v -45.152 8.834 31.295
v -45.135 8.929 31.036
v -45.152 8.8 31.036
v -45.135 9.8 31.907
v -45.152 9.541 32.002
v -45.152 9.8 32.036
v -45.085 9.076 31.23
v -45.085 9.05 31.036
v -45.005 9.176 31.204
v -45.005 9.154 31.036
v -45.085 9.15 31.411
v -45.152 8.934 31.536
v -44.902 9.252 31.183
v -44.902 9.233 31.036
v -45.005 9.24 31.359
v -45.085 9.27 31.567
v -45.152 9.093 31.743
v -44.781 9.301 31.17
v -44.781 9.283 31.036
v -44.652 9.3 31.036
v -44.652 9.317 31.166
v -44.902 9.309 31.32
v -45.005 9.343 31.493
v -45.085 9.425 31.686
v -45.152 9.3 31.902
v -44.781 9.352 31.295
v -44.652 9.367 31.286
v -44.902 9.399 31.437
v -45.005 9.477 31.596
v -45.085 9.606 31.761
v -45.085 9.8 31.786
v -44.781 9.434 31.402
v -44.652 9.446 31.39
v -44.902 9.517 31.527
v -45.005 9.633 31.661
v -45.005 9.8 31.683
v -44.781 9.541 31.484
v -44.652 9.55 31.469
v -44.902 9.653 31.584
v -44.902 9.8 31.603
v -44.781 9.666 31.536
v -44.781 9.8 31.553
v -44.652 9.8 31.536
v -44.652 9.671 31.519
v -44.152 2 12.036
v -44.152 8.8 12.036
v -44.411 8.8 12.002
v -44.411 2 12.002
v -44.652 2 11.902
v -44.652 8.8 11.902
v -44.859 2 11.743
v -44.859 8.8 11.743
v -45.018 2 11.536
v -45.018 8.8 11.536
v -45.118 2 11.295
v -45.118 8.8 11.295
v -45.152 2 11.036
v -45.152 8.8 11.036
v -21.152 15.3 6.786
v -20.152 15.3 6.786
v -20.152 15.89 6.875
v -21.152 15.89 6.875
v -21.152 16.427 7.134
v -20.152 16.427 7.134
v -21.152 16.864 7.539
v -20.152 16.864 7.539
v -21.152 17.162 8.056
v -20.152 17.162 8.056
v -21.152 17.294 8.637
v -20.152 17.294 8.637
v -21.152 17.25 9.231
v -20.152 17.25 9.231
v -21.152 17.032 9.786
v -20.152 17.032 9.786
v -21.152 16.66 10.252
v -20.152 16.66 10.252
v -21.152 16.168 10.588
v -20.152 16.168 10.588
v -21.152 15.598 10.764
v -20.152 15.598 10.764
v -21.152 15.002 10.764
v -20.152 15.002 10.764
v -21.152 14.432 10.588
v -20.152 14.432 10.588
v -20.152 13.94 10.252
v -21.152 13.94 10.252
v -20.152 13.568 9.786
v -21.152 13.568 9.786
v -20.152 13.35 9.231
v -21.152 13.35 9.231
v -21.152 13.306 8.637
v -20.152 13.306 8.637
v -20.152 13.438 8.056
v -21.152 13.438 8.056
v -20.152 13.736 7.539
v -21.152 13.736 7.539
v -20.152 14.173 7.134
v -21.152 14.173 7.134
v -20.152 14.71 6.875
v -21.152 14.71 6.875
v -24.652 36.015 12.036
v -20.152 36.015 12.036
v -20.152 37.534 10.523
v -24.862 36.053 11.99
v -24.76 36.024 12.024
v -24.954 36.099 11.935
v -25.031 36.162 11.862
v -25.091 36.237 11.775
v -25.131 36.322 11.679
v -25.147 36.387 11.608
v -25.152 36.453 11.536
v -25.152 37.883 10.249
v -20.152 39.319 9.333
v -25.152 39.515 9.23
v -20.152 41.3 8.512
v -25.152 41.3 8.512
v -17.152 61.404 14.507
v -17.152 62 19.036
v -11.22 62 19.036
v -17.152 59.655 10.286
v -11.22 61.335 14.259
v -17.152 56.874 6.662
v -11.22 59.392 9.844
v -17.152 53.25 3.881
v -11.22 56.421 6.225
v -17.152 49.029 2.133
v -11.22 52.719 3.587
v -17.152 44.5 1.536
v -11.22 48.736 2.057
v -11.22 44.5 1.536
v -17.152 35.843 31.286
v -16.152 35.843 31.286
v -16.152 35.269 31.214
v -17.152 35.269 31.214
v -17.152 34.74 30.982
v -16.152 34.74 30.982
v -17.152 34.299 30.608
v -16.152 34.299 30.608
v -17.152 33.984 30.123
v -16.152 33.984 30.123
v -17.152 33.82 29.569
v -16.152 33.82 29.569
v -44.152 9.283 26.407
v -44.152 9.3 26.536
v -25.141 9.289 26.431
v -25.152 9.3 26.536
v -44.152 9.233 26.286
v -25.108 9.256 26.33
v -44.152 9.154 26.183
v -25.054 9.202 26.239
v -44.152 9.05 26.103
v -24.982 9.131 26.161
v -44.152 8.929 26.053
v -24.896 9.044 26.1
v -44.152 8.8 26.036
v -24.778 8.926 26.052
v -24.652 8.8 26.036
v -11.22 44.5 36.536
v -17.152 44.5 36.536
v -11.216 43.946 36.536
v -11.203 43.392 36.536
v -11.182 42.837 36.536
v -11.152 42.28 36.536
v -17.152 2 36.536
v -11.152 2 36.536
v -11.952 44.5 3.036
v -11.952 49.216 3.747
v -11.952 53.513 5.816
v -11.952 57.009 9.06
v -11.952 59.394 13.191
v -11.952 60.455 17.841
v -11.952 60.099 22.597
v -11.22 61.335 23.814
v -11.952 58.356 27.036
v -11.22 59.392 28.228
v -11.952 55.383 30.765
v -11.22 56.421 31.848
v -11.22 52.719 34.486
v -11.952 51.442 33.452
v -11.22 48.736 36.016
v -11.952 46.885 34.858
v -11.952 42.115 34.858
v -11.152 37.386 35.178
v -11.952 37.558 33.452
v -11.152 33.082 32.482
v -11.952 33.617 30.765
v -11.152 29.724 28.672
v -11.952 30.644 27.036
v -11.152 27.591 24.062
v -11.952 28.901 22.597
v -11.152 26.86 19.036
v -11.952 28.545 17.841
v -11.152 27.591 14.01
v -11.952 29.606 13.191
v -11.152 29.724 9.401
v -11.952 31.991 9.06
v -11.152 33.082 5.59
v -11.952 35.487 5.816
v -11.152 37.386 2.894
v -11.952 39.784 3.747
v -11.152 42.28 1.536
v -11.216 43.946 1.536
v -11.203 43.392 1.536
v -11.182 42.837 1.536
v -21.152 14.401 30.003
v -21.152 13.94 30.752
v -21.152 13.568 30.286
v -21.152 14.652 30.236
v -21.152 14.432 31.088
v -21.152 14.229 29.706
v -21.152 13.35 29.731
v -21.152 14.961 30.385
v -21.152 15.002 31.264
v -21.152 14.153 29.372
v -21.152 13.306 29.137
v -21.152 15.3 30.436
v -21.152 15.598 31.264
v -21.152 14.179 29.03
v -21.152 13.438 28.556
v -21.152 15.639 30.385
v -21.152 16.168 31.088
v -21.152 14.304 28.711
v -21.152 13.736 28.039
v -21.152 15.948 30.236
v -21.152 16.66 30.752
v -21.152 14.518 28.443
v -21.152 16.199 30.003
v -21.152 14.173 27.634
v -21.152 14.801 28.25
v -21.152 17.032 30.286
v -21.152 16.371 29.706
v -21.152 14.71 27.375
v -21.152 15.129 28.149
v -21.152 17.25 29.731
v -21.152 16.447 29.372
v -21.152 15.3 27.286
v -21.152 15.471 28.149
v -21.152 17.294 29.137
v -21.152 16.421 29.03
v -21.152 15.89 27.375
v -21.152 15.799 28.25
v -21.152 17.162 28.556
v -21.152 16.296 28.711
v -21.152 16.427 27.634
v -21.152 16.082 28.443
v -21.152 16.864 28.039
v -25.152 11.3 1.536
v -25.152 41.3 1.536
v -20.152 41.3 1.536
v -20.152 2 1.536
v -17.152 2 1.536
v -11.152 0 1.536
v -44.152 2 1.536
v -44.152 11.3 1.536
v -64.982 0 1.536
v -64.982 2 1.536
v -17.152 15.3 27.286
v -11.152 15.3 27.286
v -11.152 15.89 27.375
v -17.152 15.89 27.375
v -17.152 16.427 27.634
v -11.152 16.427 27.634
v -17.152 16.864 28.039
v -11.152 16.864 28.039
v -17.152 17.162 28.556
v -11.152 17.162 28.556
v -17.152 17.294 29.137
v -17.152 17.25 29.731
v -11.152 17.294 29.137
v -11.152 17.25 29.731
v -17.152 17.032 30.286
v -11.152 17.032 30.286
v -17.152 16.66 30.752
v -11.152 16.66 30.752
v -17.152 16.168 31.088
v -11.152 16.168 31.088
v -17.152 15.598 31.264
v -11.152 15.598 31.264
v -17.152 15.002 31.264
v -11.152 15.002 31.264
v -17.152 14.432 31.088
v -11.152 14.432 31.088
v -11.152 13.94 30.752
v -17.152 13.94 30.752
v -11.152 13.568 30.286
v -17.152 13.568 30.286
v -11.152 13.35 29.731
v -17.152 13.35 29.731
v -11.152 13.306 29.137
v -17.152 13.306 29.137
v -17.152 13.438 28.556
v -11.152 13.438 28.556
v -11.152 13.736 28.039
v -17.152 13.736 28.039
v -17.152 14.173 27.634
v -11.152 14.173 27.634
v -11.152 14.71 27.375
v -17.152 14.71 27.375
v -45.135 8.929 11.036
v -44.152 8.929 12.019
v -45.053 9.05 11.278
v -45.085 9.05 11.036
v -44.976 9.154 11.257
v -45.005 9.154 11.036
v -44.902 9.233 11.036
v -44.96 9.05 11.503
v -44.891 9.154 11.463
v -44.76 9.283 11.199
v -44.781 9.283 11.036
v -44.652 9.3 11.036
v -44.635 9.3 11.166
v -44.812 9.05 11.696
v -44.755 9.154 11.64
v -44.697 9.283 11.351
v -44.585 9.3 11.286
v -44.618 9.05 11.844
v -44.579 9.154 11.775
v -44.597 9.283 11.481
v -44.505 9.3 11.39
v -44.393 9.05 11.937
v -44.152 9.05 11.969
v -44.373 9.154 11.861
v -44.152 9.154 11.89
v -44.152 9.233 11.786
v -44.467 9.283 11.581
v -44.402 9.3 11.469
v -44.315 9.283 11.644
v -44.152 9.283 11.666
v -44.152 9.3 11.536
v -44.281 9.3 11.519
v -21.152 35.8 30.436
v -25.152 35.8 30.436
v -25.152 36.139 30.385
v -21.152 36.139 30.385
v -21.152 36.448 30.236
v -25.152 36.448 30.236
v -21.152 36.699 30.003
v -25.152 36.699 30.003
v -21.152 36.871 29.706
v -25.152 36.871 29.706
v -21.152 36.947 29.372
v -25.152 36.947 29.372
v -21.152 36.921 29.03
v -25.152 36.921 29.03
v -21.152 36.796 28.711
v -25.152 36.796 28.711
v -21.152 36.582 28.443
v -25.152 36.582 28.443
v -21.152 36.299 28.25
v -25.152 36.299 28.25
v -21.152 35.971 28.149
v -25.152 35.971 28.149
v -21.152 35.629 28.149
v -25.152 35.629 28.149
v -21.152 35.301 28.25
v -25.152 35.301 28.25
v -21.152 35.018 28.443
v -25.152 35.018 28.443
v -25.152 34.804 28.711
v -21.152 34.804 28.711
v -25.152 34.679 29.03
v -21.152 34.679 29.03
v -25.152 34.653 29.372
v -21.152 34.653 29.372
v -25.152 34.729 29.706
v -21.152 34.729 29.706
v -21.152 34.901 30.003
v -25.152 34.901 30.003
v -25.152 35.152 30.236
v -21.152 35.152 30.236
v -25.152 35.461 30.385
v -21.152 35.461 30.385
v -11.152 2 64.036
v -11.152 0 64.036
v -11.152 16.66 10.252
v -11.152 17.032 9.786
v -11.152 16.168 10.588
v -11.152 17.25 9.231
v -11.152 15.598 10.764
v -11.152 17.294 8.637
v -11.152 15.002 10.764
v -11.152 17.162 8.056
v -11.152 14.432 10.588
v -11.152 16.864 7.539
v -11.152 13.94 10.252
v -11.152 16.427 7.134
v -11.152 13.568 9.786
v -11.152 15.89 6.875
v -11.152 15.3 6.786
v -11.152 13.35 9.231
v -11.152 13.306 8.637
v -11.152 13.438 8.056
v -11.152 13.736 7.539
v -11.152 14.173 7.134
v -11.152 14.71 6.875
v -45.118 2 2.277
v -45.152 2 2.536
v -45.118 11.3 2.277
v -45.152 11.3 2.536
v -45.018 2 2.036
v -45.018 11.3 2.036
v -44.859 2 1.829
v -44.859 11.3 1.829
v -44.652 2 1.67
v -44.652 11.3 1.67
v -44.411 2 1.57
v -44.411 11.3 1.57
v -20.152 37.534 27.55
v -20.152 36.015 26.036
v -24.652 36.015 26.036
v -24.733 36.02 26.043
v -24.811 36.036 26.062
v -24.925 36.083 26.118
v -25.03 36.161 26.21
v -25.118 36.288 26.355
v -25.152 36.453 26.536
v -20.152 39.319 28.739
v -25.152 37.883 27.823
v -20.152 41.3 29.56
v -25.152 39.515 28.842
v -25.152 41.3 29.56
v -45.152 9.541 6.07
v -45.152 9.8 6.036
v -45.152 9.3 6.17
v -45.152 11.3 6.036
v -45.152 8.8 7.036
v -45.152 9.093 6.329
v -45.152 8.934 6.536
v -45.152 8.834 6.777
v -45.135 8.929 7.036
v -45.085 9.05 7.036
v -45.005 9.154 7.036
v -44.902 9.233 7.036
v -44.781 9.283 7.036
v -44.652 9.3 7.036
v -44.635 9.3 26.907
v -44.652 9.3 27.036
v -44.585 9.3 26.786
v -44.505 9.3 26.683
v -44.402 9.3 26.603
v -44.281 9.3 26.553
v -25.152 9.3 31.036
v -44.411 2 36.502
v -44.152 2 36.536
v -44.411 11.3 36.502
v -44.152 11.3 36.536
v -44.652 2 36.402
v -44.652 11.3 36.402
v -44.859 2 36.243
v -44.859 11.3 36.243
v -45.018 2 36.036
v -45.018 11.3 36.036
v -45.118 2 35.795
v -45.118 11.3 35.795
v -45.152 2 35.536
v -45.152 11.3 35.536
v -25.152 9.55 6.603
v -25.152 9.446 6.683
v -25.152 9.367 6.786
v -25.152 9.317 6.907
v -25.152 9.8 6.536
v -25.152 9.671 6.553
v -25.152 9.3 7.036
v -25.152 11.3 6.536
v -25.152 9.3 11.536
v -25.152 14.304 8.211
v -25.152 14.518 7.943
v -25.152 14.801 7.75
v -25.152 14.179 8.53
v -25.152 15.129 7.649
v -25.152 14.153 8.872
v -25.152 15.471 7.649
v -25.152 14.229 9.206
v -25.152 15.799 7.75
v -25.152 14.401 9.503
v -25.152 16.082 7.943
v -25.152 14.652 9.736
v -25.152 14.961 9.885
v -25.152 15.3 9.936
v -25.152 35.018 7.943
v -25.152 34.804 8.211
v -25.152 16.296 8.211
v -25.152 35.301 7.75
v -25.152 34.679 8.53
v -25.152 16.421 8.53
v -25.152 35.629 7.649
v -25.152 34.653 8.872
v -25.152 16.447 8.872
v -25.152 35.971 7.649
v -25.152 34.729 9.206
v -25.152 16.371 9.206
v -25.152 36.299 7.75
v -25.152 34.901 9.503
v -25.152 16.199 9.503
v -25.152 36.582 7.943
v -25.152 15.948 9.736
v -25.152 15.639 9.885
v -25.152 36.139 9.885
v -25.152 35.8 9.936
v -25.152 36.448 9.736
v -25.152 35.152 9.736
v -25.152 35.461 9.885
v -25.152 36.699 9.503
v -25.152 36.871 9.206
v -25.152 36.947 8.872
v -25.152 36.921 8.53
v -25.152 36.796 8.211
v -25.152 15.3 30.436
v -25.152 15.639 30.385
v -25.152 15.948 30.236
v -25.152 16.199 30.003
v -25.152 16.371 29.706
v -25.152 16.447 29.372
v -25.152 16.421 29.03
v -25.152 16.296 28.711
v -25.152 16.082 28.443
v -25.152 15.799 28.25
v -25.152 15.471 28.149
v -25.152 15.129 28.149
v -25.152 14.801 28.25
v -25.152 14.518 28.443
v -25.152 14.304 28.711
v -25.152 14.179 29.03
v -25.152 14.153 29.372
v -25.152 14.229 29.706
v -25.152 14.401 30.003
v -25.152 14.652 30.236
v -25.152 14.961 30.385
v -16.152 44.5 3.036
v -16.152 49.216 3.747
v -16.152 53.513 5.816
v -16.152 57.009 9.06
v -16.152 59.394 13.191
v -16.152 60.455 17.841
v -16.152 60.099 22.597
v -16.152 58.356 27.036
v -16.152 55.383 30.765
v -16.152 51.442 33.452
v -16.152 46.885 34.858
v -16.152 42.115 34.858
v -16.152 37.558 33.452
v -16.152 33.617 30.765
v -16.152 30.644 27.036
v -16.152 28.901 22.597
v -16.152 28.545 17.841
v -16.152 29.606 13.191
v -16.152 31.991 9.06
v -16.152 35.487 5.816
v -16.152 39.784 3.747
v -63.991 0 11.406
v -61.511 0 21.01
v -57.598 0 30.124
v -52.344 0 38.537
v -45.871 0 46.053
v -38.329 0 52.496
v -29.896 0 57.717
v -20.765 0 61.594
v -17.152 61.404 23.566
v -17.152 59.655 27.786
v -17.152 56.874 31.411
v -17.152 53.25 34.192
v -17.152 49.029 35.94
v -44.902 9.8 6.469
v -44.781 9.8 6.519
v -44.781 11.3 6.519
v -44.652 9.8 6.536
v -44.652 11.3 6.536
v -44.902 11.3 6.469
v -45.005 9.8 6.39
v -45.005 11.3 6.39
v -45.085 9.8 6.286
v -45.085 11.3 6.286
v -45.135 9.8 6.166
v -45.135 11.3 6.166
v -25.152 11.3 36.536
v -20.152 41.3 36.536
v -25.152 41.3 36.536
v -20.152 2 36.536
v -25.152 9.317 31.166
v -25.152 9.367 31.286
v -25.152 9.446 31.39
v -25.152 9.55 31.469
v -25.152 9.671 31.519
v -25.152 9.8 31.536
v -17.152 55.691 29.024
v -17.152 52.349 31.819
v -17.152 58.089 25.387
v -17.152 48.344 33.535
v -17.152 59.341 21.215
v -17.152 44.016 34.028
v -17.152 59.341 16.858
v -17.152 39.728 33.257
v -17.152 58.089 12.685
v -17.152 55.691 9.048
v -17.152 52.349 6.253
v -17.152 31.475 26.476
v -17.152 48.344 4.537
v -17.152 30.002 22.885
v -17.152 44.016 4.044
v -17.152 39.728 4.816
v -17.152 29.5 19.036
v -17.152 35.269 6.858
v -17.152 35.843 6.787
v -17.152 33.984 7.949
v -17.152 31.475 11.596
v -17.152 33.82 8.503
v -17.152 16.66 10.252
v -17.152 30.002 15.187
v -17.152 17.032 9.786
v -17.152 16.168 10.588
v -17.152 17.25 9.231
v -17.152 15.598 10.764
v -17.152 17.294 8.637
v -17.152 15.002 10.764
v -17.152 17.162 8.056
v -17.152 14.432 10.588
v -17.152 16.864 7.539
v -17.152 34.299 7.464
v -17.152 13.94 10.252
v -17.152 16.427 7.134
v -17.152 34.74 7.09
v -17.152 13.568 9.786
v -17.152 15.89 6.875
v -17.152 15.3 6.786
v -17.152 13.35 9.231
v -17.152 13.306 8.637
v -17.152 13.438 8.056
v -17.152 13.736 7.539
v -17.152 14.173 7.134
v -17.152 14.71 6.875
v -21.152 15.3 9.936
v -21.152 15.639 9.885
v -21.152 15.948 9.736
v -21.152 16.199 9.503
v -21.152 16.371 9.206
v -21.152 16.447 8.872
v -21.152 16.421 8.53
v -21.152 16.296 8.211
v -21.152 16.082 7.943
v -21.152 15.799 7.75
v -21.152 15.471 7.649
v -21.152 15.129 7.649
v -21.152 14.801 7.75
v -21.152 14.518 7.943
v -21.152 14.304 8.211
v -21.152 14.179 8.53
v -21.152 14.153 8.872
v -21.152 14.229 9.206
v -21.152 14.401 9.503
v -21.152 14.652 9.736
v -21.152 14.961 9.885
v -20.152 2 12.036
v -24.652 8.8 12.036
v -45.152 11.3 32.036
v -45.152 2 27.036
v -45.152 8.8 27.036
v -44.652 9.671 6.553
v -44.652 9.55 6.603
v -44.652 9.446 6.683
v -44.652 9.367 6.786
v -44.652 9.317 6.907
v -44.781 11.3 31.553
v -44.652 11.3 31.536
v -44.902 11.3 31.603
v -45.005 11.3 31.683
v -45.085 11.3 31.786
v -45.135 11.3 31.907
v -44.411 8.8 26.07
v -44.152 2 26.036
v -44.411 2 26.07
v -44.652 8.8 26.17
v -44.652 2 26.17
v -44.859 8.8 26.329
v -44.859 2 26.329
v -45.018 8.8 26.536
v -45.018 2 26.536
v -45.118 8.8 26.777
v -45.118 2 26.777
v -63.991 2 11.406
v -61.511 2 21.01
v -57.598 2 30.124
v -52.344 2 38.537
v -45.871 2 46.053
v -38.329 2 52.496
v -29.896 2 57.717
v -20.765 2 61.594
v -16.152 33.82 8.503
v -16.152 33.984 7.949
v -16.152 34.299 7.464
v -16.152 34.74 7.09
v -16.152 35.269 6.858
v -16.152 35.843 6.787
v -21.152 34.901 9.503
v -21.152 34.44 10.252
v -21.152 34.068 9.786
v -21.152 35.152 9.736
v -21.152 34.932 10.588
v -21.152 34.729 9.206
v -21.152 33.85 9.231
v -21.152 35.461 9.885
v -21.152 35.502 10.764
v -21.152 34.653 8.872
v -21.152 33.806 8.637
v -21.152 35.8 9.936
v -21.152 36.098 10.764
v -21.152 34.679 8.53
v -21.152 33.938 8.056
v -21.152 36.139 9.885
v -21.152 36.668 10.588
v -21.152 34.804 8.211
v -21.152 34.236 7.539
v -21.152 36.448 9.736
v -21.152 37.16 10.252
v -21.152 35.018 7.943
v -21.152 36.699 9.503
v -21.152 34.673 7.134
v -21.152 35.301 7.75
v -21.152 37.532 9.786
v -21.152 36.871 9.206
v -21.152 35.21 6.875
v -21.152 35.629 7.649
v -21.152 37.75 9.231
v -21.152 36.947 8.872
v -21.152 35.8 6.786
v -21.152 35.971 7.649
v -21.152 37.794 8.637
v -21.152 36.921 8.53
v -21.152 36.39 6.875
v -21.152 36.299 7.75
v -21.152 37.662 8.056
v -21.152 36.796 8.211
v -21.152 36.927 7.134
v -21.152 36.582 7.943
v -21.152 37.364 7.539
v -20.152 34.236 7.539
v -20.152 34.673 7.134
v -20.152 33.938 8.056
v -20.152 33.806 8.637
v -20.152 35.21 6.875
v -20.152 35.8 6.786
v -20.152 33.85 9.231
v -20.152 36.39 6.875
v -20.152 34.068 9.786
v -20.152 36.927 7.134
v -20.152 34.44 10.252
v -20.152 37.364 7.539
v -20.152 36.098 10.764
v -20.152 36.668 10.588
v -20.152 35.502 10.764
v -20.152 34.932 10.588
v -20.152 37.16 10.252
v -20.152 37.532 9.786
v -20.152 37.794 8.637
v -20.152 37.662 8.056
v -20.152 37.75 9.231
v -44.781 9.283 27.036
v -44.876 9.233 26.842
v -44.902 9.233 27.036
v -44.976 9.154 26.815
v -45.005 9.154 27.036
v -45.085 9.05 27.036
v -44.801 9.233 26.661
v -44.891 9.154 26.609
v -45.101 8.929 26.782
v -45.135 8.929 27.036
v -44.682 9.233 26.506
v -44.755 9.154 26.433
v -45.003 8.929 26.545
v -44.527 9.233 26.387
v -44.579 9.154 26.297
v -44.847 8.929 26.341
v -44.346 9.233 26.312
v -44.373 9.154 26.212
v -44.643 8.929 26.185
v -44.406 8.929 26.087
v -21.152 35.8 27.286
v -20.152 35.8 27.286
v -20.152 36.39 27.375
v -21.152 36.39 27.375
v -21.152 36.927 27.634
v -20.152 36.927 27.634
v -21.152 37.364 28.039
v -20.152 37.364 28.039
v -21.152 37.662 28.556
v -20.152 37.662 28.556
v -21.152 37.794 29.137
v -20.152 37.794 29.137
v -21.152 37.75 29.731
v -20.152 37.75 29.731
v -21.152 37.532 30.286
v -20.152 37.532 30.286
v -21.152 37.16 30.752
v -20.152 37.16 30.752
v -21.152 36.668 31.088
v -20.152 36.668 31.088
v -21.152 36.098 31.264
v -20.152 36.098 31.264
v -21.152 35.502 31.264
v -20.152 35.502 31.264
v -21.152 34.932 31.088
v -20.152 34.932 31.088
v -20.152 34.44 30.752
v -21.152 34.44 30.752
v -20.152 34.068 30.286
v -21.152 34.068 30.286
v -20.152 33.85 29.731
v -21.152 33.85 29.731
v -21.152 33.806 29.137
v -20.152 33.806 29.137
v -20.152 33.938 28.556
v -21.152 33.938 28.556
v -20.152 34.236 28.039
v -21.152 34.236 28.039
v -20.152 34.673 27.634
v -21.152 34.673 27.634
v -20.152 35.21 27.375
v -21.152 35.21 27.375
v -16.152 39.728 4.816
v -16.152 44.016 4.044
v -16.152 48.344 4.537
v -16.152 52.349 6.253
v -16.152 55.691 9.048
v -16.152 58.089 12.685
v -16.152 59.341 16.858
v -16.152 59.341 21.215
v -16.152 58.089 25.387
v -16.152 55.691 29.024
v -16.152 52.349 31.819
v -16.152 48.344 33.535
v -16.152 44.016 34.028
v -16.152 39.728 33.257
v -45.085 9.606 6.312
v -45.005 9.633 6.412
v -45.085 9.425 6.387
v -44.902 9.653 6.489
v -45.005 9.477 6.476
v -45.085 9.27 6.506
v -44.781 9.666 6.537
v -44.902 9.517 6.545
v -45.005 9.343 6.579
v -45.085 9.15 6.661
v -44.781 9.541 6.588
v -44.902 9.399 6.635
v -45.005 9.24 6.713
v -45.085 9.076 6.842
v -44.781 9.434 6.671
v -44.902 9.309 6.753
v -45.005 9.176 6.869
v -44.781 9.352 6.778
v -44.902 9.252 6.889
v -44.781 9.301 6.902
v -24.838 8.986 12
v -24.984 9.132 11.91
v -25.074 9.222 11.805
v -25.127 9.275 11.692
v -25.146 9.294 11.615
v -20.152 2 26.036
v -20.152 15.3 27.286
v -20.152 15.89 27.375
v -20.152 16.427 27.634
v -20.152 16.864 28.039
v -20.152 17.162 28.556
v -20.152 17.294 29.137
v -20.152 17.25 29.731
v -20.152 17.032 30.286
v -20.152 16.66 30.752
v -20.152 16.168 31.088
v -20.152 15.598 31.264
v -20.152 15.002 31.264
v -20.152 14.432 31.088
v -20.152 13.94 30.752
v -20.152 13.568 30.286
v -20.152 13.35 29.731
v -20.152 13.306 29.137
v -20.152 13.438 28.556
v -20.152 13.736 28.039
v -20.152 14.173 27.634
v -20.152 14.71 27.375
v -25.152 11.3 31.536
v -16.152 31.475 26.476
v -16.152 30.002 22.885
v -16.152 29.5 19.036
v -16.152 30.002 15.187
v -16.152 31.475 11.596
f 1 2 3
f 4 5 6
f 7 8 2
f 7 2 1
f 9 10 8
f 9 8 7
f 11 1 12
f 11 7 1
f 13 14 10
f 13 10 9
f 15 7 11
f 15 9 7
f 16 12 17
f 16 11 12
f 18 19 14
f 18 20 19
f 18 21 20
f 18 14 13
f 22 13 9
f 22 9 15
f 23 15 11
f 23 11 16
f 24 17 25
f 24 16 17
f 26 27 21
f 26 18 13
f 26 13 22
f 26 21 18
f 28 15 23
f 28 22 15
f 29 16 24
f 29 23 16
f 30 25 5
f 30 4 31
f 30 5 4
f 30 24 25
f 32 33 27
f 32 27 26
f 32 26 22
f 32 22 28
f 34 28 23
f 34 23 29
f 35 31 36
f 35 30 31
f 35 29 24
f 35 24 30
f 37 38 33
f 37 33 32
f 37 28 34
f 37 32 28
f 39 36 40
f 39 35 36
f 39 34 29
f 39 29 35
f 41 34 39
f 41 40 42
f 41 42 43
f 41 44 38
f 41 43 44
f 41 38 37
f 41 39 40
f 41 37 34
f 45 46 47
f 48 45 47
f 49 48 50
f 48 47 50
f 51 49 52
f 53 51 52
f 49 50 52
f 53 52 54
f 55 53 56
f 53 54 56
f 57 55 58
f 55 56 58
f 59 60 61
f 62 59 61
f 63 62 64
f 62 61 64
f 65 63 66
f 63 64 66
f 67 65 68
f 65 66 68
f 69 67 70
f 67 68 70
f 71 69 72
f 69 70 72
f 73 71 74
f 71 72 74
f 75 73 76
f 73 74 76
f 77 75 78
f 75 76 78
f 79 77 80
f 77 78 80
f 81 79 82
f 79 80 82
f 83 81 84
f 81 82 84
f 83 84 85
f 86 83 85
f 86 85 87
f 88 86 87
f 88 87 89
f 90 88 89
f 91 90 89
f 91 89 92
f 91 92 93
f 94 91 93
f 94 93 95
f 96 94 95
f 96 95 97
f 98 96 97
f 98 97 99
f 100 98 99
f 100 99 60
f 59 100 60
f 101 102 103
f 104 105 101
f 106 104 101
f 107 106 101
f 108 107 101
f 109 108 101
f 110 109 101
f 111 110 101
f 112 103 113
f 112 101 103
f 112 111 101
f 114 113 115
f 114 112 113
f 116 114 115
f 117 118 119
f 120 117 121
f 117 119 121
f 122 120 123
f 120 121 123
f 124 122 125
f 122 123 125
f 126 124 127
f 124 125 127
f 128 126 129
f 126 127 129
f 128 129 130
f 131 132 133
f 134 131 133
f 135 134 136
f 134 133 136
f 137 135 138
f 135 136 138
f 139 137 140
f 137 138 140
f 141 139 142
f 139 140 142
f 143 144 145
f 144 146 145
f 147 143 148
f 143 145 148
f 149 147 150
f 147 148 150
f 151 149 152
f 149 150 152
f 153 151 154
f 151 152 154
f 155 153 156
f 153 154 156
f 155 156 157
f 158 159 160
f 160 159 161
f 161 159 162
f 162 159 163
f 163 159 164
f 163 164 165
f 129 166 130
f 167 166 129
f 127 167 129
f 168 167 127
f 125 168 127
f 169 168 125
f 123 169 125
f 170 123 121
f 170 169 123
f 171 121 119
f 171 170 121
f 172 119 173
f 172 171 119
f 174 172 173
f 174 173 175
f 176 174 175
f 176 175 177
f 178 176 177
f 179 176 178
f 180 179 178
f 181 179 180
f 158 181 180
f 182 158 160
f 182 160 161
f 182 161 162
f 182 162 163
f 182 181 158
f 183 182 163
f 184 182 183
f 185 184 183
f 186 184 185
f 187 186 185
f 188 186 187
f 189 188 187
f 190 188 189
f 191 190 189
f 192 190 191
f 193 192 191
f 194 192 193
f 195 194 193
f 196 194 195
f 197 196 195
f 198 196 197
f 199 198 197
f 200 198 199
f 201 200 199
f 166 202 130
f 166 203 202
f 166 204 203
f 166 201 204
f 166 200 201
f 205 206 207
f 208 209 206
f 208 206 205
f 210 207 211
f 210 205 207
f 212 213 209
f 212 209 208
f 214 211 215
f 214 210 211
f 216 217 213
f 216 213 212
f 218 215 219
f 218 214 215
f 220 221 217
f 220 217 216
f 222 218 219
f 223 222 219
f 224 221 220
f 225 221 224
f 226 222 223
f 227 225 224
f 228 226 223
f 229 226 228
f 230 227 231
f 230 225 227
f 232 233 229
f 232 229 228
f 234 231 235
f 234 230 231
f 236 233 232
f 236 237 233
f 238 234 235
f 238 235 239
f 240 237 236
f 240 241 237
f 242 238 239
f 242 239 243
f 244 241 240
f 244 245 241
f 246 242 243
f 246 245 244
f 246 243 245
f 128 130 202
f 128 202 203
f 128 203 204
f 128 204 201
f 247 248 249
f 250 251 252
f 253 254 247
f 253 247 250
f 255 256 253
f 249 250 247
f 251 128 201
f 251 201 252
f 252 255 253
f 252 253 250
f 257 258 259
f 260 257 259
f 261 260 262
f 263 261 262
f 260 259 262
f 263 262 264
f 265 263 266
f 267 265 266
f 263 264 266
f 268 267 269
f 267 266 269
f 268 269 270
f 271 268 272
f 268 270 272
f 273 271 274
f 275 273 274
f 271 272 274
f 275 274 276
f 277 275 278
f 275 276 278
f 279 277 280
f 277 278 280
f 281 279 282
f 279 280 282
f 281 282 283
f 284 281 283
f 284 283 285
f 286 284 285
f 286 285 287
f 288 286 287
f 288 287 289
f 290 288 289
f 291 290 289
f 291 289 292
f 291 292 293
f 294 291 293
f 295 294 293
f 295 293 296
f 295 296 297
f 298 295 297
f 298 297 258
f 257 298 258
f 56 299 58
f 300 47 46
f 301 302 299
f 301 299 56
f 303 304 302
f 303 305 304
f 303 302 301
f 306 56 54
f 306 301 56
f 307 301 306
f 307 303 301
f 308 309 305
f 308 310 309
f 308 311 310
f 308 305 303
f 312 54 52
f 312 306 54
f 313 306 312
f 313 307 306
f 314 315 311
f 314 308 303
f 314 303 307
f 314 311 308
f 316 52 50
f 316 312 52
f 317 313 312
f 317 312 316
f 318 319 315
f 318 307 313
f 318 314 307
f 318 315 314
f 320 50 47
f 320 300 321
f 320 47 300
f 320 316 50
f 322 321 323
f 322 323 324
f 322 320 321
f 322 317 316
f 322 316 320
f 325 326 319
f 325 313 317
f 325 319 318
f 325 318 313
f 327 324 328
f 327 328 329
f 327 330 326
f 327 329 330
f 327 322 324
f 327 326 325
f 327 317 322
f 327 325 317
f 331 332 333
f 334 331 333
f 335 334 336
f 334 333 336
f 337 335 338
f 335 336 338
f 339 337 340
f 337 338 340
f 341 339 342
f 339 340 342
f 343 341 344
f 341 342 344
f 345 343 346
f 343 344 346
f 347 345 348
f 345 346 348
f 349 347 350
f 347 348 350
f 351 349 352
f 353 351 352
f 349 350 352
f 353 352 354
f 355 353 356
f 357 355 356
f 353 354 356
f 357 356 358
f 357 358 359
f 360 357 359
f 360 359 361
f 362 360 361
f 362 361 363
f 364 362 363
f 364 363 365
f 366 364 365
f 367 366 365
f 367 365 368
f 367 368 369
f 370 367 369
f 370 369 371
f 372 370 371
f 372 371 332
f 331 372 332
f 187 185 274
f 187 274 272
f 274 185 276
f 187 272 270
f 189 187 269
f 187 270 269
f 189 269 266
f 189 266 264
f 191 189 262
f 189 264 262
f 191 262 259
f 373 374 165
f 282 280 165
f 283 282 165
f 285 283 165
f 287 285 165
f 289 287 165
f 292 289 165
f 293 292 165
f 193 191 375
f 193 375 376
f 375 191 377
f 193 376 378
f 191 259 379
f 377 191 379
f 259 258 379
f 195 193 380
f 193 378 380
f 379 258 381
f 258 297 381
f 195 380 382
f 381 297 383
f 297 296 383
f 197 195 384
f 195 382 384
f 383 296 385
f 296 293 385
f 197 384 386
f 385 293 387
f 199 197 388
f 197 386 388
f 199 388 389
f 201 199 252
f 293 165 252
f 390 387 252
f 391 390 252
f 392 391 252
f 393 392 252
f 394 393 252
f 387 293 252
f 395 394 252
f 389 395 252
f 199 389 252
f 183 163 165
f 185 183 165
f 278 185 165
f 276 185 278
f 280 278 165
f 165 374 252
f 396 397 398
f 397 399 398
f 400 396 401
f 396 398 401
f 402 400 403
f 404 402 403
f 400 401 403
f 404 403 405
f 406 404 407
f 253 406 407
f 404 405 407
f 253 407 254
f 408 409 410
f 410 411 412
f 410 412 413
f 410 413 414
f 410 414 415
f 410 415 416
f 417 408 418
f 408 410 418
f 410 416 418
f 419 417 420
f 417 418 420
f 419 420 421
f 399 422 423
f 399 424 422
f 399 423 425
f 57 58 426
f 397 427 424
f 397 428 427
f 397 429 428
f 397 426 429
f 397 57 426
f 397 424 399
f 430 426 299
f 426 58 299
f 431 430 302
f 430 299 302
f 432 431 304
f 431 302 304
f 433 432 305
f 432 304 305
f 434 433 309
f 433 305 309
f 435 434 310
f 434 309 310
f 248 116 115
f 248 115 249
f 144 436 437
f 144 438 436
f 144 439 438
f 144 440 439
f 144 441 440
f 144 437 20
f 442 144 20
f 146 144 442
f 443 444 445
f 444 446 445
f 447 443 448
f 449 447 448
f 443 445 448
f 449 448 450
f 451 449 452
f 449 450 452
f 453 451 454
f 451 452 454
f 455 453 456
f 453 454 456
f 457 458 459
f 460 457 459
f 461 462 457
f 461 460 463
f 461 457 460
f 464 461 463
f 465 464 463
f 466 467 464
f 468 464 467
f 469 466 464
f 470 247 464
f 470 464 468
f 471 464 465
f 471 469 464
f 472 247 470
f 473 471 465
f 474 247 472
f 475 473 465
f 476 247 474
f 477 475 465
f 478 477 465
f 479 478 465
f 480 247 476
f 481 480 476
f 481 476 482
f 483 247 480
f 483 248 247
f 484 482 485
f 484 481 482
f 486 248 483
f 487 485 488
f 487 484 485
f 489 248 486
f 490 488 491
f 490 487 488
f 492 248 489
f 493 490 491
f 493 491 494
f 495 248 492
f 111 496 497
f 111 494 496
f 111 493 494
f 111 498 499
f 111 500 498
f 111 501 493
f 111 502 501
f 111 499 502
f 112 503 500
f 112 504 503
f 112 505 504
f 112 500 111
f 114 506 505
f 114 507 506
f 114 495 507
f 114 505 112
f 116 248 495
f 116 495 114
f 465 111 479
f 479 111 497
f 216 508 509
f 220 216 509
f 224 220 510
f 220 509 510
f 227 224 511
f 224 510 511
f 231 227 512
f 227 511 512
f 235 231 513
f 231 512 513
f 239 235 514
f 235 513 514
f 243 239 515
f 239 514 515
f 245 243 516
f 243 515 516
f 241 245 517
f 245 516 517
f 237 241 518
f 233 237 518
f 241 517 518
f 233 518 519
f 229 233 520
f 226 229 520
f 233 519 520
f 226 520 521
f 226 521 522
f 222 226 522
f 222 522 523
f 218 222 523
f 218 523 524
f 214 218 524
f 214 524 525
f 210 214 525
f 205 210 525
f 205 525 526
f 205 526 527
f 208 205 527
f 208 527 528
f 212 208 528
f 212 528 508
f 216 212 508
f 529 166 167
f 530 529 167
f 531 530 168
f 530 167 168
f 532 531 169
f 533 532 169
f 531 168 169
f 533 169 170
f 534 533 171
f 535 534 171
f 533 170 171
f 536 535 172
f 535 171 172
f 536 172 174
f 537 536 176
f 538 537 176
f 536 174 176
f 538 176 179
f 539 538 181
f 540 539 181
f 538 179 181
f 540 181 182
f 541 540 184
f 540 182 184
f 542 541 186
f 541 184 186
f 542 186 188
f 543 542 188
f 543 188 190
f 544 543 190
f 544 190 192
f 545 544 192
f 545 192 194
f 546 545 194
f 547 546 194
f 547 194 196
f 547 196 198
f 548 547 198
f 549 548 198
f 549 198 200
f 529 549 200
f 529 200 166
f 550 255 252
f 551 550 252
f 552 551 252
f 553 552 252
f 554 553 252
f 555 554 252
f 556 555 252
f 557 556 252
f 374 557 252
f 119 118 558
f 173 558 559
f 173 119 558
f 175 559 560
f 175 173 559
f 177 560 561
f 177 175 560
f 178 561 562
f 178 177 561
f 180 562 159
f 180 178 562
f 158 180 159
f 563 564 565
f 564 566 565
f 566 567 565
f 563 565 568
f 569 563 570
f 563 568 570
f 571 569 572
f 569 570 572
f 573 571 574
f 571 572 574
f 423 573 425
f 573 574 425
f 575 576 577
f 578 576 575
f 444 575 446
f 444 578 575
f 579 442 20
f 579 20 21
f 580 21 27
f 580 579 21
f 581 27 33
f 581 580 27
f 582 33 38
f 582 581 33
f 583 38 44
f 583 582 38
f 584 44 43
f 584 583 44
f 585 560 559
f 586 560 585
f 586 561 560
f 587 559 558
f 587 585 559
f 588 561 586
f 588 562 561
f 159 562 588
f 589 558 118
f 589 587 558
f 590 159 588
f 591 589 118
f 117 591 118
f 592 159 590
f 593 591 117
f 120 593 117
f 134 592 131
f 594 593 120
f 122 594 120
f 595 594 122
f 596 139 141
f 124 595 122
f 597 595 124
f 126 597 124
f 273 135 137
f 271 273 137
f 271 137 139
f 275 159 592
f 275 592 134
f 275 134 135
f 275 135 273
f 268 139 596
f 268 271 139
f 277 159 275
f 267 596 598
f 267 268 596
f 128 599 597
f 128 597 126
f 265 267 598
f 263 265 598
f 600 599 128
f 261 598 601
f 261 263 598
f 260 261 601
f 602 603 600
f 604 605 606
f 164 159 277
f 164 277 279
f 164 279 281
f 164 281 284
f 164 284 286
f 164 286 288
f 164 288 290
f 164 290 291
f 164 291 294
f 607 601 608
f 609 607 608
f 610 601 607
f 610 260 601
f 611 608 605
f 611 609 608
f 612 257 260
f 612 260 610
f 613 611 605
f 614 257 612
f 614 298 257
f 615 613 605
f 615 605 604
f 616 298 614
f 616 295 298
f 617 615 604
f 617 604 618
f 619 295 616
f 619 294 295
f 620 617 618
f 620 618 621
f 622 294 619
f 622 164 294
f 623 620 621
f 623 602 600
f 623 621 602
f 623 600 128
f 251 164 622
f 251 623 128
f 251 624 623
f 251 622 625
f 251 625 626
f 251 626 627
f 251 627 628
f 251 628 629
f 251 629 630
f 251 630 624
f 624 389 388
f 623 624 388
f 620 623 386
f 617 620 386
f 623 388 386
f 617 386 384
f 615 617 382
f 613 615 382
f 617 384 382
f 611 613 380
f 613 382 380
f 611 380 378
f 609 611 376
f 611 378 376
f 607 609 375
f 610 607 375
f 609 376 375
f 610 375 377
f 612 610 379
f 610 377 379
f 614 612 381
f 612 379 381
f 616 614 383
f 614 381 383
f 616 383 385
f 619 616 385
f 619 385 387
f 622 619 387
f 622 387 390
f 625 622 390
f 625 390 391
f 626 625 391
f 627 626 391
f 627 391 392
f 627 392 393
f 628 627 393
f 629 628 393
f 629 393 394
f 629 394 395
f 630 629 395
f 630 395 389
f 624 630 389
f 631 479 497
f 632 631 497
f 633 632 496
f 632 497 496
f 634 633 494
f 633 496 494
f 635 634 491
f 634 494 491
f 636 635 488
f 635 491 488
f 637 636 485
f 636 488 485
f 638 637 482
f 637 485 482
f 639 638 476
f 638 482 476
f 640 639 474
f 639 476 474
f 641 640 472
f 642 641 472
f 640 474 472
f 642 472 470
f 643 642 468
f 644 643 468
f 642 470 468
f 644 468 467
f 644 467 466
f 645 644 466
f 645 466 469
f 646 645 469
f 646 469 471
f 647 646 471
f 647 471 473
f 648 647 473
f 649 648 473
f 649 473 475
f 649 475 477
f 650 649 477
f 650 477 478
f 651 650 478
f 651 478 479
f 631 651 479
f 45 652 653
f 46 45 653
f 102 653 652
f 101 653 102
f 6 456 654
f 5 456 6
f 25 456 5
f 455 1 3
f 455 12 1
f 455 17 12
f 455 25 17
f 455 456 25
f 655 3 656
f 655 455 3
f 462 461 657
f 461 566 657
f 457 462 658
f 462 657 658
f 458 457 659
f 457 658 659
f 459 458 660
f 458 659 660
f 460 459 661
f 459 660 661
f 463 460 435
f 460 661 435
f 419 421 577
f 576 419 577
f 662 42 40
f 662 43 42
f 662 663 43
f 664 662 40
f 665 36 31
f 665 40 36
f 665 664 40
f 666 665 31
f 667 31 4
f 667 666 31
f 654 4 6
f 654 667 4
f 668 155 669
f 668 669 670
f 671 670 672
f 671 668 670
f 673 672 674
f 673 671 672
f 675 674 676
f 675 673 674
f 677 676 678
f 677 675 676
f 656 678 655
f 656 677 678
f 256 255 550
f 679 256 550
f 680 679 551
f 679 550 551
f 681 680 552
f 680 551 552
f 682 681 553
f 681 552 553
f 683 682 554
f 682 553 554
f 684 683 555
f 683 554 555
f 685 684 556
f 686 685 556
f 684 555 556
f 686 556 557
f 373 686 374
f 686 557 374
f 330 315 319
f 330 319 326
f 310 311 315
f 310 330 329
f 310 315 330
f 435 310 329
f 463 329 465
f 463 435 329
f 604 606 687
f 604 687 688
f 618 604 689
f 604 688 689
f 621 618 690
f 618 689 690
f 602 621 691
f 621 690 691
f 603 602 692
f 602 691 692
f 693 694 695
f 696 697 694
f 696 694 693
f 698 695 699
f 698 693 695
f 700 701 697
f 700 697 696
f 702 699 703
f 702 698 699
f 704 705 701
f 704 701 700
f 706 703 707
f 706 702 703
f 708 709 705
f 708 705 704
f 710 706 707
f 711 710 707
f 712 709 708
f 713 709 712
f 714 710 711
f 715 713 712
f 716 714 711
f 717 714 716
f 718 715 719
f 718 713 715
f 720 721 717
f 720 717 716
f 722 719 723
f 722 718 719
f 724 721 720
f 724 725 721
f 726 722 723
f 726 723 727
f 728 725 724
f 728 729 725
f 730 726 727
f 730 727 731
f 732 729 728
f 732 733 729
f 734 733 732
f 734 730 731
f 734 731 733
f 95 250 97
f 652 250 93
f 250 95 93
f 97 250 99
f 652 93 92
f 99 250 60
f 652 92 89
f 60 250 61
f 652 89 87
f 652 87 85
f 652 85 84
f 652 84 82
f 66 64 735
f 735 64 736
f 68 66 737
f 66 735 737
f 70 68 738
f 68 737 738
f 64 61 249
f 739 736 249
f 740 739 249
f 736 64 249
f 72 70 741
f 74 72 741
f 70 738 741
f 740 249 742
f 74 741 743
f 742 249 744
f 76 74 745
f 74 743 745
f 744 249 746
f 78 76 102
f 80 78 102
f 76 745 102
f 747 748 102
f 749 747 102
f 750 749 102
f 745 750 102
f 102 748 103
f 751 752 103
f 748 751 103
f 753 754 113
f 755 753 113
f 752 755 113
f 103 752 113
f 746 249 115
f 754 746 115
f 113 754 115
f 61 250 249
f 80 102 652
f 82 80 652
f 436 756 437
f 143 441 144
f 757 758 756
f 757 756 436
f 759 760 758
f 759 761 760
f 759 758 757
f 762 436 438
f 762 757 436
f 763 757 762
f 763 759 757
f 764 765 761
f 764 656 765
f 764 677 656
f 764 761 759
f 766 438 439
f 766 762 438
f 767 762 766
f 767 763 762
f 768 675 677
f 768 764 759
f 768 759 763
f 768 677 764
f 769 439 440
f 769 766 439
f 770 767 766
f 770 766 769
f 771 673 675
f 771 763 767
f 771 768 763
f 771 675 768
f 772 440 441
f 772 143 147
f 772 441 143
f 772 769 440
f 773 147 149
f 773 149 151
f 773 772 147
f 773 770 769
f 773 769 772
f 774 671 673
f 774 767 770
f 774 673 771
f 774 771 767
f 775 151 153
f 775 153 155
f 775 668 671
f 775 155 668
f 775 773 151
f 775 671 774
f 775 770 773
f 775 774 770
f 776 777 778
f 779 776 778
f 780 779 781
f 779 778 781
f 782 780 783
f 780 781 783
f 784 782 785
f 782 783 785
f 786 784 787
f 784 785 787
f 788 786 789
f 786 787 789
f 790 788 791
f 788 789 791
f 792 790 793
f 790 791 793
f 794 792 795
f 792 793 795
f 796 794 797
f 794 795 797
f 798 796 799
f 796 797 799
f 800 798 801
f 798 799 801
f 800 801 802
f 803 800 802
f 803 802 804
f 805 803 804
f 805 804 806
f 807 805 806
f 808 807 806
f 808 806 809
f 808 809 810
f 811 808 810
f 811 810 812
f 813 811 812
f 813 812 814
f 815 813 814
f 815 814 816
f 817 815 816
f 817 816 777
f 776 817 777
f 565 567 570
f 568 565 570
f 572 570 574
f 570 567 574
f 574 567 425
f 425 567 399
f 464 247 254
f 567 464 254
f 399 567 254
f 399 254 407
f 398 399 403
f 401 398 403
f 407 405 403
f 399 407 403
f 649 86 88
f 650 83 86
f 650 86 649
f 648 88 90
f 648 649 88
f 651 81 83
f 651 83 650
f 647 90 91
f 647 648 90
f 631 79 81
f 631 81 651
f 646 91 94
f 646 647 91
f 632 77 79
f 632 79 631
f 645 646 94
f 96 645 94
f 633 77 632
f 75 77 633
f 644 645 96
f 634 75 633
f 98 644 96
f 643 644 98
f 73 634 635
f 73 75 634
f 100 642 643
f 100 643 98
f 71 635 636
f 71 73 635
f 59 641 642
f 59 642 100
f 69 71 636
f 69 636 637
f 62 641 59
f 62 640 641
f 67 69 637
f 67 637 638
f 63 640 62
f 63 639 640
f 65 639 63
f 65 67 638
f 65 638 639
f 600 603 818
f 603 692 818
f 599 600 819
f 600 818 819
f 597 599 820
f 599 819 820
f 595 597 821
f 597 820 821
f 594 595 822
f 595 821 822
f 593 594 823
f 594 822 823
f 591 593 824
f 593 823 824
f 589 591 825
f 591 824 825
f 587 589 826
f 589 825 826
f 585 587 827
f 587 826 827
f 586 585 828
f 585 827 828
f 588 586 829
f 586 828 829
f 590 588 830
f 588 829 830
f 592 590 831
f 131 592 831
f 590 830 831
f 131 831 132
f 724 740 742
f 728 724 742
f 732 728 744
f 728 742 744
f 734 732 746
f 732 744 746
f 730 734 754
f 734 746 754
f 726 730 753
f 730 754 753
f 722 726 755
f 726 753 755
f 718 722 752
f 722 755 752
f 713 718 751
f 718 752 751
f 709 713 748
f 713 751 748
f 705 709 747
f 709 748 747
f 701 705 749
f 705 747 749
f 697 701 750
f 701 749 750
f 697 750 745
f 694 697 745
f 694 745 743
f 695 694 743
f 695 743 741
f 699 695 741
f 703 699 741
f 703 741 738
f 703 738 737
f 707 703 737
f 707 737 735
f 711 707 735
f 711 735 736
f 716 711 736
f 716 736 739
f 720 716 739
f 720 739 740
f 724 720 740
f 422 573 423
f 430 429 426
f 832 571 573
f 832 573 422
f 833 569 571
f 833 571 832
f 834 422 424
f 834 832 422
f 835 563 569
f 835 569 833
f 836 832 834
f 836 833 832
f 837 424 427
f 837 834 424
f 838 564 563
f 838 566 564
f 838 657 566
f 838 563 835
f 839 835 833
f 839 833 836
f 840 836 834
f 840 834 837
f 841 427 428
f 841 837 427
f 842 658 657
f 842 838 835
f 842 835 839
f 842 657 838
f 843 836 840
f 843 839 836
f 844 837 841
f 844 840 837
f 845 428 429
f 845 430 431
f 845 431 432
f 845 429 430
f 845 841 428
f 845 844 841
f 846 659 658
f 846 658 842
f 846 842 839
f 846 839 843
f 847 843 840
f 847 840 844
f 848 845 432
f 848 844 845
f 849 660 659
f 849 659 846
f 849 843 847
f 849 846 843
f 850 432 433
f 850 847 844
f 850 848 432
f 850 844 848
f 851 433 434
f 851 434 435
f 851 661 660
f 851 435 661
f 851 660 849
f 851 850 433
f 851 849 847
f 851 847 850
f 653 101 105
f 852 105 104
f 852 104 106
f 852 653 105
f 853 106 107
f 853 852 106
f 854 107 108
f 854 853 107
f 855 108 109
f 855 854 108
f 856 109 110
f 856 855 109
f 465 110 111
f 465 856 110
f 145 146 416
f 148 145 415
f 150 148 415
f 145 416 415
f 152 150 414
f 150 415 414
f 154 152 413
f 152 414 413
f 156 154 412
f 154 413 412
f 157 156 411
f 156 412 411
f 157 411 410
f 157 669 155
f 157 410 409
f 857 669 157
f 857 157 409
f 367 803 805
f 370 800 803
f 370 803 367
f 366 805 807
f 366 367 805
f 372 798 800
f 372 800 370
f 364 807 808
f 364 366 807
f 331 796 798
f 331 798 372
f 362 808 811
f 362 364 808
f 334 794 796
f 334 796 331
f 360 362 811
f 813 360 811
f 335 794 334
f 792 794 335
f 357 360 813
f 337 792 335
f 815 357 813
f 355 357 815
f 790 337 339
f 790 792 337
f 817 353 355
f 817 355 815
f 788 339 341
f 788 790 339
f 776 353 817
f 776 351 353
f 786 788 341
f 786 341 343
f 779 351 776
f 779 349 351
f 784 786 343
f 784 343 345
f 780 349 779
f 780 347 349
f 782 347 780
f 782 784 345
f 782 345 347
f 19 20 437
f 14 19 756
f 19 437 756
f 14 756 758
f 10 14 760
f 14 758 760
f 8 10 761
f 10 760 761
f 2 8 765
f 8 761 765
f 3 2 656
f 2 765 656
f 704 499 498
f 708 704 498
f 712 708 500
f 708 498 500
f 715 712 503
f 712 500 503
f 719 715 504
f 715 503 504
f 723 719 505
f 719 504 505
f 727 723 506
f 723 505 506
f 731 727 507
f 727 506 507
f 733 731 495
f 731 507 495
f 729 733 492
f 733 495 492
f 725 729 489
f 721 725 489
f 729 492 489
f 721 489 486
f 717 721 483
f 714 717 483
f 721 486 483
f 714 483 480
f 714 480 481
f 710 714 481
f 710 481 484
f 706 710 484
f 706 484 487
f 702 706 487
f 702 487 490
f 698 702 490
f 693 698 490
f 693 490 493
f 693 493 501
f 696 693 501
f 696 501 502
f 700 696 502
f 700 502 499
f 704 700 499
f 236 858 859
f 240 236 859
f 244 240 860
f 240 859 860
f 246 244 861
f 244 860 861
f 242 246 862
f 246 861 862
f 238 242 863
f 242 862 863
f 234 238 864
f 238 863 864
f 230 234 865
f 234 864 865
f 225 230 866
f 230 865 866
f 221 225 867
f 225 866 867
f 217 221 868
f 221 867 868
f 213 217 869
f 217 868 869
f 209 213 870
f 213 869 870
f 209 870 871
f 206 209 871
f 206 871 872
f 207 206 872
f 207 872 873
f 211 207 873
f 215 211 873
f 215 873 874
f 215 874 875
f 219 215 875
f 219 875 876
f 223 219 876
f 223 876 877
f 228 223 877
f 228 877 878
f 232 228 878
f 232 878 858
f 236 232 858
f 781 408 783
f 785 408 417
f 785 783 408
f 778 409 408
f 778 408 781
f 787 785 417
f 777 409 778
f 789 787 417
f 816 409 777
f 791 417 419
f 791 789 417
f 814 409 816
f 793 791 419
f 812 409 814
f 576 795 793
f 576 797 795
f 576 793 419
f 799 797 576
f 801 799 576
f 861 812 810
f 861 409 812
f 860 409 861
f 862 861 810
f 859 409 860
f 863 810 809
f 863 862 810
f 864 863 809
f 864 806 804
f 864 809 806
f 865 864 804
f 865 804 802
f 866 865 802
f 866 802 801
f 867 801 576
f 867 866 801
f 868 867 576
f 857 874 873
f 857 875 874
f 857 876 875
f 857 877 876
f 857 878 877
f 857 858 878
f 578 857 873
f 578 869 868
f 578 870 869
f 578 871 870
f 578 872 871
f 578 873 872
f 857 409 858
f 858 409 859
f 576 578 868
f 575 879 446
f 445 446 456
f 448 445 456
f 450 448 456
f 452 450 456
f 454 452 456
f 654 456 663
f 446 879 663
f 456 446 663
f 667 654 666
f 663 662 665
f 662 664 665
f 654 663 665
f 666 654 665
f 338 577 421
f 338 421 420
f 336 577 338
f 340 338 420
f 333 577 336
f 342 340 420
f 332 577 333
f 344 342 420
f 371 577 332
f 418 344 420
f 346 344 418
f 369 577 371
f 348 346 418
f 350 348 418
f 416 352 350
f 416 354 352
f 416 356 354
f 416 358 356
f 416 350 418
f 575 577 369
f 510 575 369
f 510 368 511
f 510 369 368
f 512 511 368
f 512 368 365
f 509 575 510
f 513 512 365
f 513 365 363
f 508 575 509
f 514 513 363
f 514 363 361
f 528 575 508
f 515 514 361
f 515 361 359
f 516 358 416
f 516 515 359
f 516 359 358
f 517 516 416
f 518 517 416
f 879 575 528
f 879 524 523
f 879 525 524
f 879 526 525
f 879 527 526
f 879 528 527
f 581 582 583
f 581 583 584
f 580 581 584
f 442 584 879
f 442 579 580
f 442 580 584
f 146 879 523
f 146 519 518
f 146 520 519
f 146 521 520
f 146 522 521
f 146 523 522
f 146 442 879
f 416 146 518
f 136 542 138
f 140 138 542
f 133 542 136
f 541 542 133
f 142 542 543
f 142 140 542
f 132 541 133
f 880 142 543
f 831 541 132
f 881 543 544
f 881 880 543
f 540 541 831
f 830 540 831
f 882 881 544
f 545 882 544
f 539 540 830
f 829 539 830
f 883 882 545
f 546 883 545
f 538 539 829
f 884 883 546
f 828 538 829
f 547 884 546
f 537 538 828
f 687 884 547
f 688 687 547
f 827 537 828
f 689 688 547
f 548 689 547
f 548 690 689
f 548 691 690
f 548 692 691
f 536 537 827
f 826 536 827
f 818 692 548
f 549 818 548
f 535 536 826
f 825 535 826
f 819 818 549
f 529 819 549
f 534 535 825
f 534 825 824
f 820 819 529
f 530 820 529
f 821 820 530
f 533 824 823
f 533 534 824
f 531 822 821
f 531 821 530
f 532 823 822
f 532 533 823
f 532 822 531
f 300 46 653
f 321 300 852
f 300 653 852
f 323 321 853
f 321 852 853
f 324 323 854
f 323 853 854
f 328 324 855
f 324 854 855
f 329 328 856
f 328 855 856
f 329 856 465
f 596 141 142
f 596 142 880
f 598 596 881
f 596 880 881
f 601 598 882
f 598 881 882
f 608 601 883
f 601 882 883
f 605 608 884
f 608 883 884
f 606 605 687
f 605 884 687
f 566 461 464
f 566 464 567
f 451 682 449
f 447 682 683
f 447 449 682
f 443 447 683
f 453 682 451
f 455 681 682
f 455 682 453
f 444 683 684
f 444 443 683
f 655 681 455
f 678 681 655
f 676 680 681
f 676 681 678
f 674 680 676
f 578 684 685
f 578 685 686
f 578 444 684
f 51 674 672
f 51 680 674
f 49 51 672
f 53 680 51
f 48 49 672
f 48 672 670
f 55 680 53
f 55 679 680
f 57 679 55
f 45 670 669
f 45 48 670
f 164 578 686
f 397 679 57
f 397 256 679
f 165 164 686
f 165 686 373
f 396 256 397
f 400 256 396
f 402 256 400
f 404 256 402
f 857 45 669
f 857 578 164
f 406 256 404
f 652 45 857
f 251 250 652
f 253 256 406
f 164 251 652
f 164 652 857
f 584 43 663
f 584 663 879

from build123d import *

# Parameters (mm, degrees)
EXTRUDE_1_DEPTH     = 2
SKETCH_2_W          = 6
SKETCH_2_H          = 35
EXTRUDE_2_DEPTH     = 60
FILLET_1_R          = 17.5
SKETCH_3_R          = 16
CUT_EXTRUDE_1_DEPTH = 5
CHAMFER_1_SIZE      = 1.640243073
CHAMFER_1_SIZE_2    = 0.8
SKETCH_4_R          = 15
CUT_EXTRUDE_2_DEPTH = 102.631713982
SKETCH_5_W          = 25
SKETCH_5_H          = 10.5
EXTRUDE_3_DEPTH     = 7.3
EXTRUDE_4_DEPTH     = 2
FILLET_2_R          = 1
EXTRUDE_5_DEPTH     = 5
SKETCH_9_R          = 1.15
CUT_EXTRUDE_3_DEPTH = 98.627174941
SKETCH_10_R         = 2
CUT_EXTRUDE_4_DEPTH = 10
FILLET_3_R          = 0.5


# Some blends are built 0.0001 mm under size
with BuildPart() as part:
    # 스케치1 → 보스-돌출1 (new body)
    with BuildSketch(Plane(origin=(0, 0, 0), x_dir=(1, 0, 0), z_dir=(0, 1, 0))):
        with BuildLine():
            Line((-11.151844037, -1.536211432), (-64.981844037, -1.536211432))
            ThreePointArc((-64.981844037, -1.536211432), (-49.250859027, -42.418779863), (-11.151844037, -64.036211432))
            Line((-11.151844037, -64.036211432), (-11.151844037, -1.536211432))
        make_face()
    extrude(amount=EXTRUDE_1_DEPTH)

    # 스케치2 → 보스-돌출2 (add)
    with BuildSketch(Plane(origin=(0, 2, 0), x_dir=(1, 0, 0), z_dir=(0, 1, 0))):
        with Locations((-14.151844037, -19.036211432)):
            Rectangle(SKETCH_2_W, SKETCH_2_H)
    extrude(amount=EXTRUDE_2_DEPTH)

    # 필렛1
    fillet_1_edges = [part.edges().sort_by_distance(p)[0] for p in [
        (-14.151844037, 62, 1.536211432),
        (-14.151844037, 62, 36.536211432),
    ]]
    fillet(fillet_1_edges, radius=FILLET_1_R - 0.0001)  # a hair under: the kernel refuses the full size

    # 스케치3 → 컷-돌출1 (cut)
    with BuildSketch(Plane(origin=(-11.151844037, 0, 0), x_dir=(0, 0, -1), z_dir=(1, 0, 0))):
        with Locations((-19.036211432, 44.5)):
            Circle(SKETCH_3_R)
    extrude(amount=-CUT_EXTRUDE_1_DEPTH, mode=Mode.SUBTRACT)

    # 모따기1
    # the kernel refuses this chamfer: 1.640243073, 0.8 mm, written as the material it takes off along each edge
    with BuildSketch(Plane(origin=(-11.151844037, 44.5, 19.036211432), x_dir=(0, 0, -1), z_dir=(0, -1, 0))) as chamfer_1_piece_1:
        Polygon((16 + CHAMFER_1_SIZE, 0), (16, -CHAMFER_1_SIZE_2), (16, 0), align=None)
    revolve(axis=Axis((-11.151844037, 44.5, 19.036211432), (1, 0, 0)), mode=Mode.SUBTRACT)

    # 스케치4 → 컷-돌출2 (cut, through all)
    with BuildSketch(Plane(origin=(-16.151844037, 0, 0), x_dir=(0, 0, -1), z_dir=(1, 0, 0))):
        with Locations((-19.036211432, 44.5)):
            Circle(SKETCH_4_R)
    extrude(amount=-CUT_EXTRUDE_2_DEPTH, mode=Mode.SUBTRACT)

    # 스케치5 → 보스-돌출3 (add)
    with BuildSketch(Plane(origin=(0, 2, 0), x_dir=(1, 0, 0), z_dir=(0, 1, 0))):
        with Locations((-32.651844037, -6.786211432)):
            Rectangle(SKETCH_5_W, SKETCH_5_H)
        with Locations((-32.651844037, -31.286211432)):
            Rectangle(SKETCH_5_W, SKETCH_5_H)
    extrude(amount=EXTRUDE_3_DEPTH)

    # 스케치6 → 보스-돌출4 (add)
    with BuildSketch(Plane(origin=(0, 9.3, 0), x_dir=(1, 0, 0), z_dir=(0, 1, 0))):
        Polygon((-45.151844037, -31.536211432), (-25.151844037, -31.536211432), (-25.151844037, -26.036211432), (-20.151844037, -26.036211432), (-20.151844037, -36.536211432), (-45.151844037, -36.536211432), align=None)
        Polygon((-45.151844037, -1.536211432), (-20.151844037, -1.536211432), (-20.151844037, -12.036211432), (-25.151844037, -12.036211432), (-25.151844037, -6.536211432), (-45.151844037, -6.536211432), align=None)
    extrude(amount=EXTRUDE_4_DEPTH)

    # 필렛2
    fillet_2_edges = [part.edges().sort_by_distance(p)[0] for p in [
        (-45.151844037, 6.65, 1.536211432),
        (-45.151844037, 5.65, 12.036211432),
        (-45.151844037, 5.65, 26.036211432),
        (-45.151844037, 6.65, 36.536211432),
    ]]
    fillet(fillet_2_edges, radius=FILLET_2_R)

    # 스케치7 → 보스-돌출5 (add)
    with BuildSketch(Plane.ZY.offset(25.151844037)):
        with BuildLine():
            Line((1.536211432, 11.3), (12.036211432, 11.3))
            Line((12.036211432, 11.3), (12.036211432, 36.014718626))
            ThreePointArc((12.036211432, 36.014718626), (9.884247068, 38.397414624), (8.511953739, 41.3))
            Line((8.511953739, 41.3), (1.536211432, 41.3))
            Line((1.536211432, 41.3), (1.536211432, 11.3))
        make_face()
        with BuildLine():
            Line((36.536211432, 11.3), (26.036211432, 11.3))
            Line((26.036211432, 11.3), (26.036211432, 36.014718626))
            ThreePointArc((26.036211432, 36.014718626), (28.188175797, 38.397414624), (29.560469126, 41.3))
            Line((29.560469126, 41.3), (36.536211432, 41.3))
            Line((36.536211432, 41.3), (36.536211432, 11.3))
        make_face()
    extrude(amount=-EXTRUDE_5_DEPTH)

    # 스케치9 → 컷-돌출3 (cut, through all)
    with BuildSketch(Plane.ZY.offset(25.151844037)):
        with Locations((8.786211432, 35.8)):
            Circle(SKETCH_9_R)
        with Locations((8.786211432, 15.3)):
            Circle(SKETCH_9_R)
        with Locations((29.286211432, 15.3)):
            Circle(SKETCH_9_R)
        with Locations((29.286211432, 35.8)):
            Circle(SKETCH_9_R)
    extrude(amount=-CUT_EXTRUDE_3_DEPTH, mode=Mode.SUBTRACT)

    # 스케치10 → 컷-돌출4 (cut)
    with BuildSketch(Plane(origin=(-11.151844037, 0, 0), x_dir=(0, 0, -1), z_dir=(1, 0, 0))):
        with Locations((-29.286211432, 15.3)):
            Circle(SKETCH_10_R)
        with Locations((-8.786211432, 15.3)):
            Circle(SKETCH_10_R)
        with Locations((-8.786211432, 35.8)):
            Circle(SKETCH_10_R)
        with Locations((-29.286211432, 35.8)):
            Circle(SKETCH_10_R)
    extrude(amount=-CUT_EXTRUDE_4_DEPTH, mode=Mode.SUBTRACT)

    # 필렛3
    fillet_3_edges = [part.edges().sort_by_distance(p)[0] for p in [
        (-45.151844037, 10.3, 31.536211432),
        (-25.151844037, 22.657359313, 26.036211432),
        (-35.151844037, 9.3, 31.536211432),
        (-45.151844037, 9.3, 29.286211432),
        (-44.858950818, 9.3, 26.329104651),
        (-34.651844037, 9.3, 12.036211432),
        (-44.858950818, 9.3, 11.743318213),
        (-45.151844037, 9.3, 8.786211432),
        (-35.151844037, 9.3, 6.536211432),
        (-45.151844037, 10.3, 6.536211432),
        (-25.151844037, 22.657359313, 12.036211432),
        (-34.651844037, 9.3, 26.036211432),
    ]]
    fillet(fillet_3_edges, radius=FILLET_3_R)


solid = part.part
